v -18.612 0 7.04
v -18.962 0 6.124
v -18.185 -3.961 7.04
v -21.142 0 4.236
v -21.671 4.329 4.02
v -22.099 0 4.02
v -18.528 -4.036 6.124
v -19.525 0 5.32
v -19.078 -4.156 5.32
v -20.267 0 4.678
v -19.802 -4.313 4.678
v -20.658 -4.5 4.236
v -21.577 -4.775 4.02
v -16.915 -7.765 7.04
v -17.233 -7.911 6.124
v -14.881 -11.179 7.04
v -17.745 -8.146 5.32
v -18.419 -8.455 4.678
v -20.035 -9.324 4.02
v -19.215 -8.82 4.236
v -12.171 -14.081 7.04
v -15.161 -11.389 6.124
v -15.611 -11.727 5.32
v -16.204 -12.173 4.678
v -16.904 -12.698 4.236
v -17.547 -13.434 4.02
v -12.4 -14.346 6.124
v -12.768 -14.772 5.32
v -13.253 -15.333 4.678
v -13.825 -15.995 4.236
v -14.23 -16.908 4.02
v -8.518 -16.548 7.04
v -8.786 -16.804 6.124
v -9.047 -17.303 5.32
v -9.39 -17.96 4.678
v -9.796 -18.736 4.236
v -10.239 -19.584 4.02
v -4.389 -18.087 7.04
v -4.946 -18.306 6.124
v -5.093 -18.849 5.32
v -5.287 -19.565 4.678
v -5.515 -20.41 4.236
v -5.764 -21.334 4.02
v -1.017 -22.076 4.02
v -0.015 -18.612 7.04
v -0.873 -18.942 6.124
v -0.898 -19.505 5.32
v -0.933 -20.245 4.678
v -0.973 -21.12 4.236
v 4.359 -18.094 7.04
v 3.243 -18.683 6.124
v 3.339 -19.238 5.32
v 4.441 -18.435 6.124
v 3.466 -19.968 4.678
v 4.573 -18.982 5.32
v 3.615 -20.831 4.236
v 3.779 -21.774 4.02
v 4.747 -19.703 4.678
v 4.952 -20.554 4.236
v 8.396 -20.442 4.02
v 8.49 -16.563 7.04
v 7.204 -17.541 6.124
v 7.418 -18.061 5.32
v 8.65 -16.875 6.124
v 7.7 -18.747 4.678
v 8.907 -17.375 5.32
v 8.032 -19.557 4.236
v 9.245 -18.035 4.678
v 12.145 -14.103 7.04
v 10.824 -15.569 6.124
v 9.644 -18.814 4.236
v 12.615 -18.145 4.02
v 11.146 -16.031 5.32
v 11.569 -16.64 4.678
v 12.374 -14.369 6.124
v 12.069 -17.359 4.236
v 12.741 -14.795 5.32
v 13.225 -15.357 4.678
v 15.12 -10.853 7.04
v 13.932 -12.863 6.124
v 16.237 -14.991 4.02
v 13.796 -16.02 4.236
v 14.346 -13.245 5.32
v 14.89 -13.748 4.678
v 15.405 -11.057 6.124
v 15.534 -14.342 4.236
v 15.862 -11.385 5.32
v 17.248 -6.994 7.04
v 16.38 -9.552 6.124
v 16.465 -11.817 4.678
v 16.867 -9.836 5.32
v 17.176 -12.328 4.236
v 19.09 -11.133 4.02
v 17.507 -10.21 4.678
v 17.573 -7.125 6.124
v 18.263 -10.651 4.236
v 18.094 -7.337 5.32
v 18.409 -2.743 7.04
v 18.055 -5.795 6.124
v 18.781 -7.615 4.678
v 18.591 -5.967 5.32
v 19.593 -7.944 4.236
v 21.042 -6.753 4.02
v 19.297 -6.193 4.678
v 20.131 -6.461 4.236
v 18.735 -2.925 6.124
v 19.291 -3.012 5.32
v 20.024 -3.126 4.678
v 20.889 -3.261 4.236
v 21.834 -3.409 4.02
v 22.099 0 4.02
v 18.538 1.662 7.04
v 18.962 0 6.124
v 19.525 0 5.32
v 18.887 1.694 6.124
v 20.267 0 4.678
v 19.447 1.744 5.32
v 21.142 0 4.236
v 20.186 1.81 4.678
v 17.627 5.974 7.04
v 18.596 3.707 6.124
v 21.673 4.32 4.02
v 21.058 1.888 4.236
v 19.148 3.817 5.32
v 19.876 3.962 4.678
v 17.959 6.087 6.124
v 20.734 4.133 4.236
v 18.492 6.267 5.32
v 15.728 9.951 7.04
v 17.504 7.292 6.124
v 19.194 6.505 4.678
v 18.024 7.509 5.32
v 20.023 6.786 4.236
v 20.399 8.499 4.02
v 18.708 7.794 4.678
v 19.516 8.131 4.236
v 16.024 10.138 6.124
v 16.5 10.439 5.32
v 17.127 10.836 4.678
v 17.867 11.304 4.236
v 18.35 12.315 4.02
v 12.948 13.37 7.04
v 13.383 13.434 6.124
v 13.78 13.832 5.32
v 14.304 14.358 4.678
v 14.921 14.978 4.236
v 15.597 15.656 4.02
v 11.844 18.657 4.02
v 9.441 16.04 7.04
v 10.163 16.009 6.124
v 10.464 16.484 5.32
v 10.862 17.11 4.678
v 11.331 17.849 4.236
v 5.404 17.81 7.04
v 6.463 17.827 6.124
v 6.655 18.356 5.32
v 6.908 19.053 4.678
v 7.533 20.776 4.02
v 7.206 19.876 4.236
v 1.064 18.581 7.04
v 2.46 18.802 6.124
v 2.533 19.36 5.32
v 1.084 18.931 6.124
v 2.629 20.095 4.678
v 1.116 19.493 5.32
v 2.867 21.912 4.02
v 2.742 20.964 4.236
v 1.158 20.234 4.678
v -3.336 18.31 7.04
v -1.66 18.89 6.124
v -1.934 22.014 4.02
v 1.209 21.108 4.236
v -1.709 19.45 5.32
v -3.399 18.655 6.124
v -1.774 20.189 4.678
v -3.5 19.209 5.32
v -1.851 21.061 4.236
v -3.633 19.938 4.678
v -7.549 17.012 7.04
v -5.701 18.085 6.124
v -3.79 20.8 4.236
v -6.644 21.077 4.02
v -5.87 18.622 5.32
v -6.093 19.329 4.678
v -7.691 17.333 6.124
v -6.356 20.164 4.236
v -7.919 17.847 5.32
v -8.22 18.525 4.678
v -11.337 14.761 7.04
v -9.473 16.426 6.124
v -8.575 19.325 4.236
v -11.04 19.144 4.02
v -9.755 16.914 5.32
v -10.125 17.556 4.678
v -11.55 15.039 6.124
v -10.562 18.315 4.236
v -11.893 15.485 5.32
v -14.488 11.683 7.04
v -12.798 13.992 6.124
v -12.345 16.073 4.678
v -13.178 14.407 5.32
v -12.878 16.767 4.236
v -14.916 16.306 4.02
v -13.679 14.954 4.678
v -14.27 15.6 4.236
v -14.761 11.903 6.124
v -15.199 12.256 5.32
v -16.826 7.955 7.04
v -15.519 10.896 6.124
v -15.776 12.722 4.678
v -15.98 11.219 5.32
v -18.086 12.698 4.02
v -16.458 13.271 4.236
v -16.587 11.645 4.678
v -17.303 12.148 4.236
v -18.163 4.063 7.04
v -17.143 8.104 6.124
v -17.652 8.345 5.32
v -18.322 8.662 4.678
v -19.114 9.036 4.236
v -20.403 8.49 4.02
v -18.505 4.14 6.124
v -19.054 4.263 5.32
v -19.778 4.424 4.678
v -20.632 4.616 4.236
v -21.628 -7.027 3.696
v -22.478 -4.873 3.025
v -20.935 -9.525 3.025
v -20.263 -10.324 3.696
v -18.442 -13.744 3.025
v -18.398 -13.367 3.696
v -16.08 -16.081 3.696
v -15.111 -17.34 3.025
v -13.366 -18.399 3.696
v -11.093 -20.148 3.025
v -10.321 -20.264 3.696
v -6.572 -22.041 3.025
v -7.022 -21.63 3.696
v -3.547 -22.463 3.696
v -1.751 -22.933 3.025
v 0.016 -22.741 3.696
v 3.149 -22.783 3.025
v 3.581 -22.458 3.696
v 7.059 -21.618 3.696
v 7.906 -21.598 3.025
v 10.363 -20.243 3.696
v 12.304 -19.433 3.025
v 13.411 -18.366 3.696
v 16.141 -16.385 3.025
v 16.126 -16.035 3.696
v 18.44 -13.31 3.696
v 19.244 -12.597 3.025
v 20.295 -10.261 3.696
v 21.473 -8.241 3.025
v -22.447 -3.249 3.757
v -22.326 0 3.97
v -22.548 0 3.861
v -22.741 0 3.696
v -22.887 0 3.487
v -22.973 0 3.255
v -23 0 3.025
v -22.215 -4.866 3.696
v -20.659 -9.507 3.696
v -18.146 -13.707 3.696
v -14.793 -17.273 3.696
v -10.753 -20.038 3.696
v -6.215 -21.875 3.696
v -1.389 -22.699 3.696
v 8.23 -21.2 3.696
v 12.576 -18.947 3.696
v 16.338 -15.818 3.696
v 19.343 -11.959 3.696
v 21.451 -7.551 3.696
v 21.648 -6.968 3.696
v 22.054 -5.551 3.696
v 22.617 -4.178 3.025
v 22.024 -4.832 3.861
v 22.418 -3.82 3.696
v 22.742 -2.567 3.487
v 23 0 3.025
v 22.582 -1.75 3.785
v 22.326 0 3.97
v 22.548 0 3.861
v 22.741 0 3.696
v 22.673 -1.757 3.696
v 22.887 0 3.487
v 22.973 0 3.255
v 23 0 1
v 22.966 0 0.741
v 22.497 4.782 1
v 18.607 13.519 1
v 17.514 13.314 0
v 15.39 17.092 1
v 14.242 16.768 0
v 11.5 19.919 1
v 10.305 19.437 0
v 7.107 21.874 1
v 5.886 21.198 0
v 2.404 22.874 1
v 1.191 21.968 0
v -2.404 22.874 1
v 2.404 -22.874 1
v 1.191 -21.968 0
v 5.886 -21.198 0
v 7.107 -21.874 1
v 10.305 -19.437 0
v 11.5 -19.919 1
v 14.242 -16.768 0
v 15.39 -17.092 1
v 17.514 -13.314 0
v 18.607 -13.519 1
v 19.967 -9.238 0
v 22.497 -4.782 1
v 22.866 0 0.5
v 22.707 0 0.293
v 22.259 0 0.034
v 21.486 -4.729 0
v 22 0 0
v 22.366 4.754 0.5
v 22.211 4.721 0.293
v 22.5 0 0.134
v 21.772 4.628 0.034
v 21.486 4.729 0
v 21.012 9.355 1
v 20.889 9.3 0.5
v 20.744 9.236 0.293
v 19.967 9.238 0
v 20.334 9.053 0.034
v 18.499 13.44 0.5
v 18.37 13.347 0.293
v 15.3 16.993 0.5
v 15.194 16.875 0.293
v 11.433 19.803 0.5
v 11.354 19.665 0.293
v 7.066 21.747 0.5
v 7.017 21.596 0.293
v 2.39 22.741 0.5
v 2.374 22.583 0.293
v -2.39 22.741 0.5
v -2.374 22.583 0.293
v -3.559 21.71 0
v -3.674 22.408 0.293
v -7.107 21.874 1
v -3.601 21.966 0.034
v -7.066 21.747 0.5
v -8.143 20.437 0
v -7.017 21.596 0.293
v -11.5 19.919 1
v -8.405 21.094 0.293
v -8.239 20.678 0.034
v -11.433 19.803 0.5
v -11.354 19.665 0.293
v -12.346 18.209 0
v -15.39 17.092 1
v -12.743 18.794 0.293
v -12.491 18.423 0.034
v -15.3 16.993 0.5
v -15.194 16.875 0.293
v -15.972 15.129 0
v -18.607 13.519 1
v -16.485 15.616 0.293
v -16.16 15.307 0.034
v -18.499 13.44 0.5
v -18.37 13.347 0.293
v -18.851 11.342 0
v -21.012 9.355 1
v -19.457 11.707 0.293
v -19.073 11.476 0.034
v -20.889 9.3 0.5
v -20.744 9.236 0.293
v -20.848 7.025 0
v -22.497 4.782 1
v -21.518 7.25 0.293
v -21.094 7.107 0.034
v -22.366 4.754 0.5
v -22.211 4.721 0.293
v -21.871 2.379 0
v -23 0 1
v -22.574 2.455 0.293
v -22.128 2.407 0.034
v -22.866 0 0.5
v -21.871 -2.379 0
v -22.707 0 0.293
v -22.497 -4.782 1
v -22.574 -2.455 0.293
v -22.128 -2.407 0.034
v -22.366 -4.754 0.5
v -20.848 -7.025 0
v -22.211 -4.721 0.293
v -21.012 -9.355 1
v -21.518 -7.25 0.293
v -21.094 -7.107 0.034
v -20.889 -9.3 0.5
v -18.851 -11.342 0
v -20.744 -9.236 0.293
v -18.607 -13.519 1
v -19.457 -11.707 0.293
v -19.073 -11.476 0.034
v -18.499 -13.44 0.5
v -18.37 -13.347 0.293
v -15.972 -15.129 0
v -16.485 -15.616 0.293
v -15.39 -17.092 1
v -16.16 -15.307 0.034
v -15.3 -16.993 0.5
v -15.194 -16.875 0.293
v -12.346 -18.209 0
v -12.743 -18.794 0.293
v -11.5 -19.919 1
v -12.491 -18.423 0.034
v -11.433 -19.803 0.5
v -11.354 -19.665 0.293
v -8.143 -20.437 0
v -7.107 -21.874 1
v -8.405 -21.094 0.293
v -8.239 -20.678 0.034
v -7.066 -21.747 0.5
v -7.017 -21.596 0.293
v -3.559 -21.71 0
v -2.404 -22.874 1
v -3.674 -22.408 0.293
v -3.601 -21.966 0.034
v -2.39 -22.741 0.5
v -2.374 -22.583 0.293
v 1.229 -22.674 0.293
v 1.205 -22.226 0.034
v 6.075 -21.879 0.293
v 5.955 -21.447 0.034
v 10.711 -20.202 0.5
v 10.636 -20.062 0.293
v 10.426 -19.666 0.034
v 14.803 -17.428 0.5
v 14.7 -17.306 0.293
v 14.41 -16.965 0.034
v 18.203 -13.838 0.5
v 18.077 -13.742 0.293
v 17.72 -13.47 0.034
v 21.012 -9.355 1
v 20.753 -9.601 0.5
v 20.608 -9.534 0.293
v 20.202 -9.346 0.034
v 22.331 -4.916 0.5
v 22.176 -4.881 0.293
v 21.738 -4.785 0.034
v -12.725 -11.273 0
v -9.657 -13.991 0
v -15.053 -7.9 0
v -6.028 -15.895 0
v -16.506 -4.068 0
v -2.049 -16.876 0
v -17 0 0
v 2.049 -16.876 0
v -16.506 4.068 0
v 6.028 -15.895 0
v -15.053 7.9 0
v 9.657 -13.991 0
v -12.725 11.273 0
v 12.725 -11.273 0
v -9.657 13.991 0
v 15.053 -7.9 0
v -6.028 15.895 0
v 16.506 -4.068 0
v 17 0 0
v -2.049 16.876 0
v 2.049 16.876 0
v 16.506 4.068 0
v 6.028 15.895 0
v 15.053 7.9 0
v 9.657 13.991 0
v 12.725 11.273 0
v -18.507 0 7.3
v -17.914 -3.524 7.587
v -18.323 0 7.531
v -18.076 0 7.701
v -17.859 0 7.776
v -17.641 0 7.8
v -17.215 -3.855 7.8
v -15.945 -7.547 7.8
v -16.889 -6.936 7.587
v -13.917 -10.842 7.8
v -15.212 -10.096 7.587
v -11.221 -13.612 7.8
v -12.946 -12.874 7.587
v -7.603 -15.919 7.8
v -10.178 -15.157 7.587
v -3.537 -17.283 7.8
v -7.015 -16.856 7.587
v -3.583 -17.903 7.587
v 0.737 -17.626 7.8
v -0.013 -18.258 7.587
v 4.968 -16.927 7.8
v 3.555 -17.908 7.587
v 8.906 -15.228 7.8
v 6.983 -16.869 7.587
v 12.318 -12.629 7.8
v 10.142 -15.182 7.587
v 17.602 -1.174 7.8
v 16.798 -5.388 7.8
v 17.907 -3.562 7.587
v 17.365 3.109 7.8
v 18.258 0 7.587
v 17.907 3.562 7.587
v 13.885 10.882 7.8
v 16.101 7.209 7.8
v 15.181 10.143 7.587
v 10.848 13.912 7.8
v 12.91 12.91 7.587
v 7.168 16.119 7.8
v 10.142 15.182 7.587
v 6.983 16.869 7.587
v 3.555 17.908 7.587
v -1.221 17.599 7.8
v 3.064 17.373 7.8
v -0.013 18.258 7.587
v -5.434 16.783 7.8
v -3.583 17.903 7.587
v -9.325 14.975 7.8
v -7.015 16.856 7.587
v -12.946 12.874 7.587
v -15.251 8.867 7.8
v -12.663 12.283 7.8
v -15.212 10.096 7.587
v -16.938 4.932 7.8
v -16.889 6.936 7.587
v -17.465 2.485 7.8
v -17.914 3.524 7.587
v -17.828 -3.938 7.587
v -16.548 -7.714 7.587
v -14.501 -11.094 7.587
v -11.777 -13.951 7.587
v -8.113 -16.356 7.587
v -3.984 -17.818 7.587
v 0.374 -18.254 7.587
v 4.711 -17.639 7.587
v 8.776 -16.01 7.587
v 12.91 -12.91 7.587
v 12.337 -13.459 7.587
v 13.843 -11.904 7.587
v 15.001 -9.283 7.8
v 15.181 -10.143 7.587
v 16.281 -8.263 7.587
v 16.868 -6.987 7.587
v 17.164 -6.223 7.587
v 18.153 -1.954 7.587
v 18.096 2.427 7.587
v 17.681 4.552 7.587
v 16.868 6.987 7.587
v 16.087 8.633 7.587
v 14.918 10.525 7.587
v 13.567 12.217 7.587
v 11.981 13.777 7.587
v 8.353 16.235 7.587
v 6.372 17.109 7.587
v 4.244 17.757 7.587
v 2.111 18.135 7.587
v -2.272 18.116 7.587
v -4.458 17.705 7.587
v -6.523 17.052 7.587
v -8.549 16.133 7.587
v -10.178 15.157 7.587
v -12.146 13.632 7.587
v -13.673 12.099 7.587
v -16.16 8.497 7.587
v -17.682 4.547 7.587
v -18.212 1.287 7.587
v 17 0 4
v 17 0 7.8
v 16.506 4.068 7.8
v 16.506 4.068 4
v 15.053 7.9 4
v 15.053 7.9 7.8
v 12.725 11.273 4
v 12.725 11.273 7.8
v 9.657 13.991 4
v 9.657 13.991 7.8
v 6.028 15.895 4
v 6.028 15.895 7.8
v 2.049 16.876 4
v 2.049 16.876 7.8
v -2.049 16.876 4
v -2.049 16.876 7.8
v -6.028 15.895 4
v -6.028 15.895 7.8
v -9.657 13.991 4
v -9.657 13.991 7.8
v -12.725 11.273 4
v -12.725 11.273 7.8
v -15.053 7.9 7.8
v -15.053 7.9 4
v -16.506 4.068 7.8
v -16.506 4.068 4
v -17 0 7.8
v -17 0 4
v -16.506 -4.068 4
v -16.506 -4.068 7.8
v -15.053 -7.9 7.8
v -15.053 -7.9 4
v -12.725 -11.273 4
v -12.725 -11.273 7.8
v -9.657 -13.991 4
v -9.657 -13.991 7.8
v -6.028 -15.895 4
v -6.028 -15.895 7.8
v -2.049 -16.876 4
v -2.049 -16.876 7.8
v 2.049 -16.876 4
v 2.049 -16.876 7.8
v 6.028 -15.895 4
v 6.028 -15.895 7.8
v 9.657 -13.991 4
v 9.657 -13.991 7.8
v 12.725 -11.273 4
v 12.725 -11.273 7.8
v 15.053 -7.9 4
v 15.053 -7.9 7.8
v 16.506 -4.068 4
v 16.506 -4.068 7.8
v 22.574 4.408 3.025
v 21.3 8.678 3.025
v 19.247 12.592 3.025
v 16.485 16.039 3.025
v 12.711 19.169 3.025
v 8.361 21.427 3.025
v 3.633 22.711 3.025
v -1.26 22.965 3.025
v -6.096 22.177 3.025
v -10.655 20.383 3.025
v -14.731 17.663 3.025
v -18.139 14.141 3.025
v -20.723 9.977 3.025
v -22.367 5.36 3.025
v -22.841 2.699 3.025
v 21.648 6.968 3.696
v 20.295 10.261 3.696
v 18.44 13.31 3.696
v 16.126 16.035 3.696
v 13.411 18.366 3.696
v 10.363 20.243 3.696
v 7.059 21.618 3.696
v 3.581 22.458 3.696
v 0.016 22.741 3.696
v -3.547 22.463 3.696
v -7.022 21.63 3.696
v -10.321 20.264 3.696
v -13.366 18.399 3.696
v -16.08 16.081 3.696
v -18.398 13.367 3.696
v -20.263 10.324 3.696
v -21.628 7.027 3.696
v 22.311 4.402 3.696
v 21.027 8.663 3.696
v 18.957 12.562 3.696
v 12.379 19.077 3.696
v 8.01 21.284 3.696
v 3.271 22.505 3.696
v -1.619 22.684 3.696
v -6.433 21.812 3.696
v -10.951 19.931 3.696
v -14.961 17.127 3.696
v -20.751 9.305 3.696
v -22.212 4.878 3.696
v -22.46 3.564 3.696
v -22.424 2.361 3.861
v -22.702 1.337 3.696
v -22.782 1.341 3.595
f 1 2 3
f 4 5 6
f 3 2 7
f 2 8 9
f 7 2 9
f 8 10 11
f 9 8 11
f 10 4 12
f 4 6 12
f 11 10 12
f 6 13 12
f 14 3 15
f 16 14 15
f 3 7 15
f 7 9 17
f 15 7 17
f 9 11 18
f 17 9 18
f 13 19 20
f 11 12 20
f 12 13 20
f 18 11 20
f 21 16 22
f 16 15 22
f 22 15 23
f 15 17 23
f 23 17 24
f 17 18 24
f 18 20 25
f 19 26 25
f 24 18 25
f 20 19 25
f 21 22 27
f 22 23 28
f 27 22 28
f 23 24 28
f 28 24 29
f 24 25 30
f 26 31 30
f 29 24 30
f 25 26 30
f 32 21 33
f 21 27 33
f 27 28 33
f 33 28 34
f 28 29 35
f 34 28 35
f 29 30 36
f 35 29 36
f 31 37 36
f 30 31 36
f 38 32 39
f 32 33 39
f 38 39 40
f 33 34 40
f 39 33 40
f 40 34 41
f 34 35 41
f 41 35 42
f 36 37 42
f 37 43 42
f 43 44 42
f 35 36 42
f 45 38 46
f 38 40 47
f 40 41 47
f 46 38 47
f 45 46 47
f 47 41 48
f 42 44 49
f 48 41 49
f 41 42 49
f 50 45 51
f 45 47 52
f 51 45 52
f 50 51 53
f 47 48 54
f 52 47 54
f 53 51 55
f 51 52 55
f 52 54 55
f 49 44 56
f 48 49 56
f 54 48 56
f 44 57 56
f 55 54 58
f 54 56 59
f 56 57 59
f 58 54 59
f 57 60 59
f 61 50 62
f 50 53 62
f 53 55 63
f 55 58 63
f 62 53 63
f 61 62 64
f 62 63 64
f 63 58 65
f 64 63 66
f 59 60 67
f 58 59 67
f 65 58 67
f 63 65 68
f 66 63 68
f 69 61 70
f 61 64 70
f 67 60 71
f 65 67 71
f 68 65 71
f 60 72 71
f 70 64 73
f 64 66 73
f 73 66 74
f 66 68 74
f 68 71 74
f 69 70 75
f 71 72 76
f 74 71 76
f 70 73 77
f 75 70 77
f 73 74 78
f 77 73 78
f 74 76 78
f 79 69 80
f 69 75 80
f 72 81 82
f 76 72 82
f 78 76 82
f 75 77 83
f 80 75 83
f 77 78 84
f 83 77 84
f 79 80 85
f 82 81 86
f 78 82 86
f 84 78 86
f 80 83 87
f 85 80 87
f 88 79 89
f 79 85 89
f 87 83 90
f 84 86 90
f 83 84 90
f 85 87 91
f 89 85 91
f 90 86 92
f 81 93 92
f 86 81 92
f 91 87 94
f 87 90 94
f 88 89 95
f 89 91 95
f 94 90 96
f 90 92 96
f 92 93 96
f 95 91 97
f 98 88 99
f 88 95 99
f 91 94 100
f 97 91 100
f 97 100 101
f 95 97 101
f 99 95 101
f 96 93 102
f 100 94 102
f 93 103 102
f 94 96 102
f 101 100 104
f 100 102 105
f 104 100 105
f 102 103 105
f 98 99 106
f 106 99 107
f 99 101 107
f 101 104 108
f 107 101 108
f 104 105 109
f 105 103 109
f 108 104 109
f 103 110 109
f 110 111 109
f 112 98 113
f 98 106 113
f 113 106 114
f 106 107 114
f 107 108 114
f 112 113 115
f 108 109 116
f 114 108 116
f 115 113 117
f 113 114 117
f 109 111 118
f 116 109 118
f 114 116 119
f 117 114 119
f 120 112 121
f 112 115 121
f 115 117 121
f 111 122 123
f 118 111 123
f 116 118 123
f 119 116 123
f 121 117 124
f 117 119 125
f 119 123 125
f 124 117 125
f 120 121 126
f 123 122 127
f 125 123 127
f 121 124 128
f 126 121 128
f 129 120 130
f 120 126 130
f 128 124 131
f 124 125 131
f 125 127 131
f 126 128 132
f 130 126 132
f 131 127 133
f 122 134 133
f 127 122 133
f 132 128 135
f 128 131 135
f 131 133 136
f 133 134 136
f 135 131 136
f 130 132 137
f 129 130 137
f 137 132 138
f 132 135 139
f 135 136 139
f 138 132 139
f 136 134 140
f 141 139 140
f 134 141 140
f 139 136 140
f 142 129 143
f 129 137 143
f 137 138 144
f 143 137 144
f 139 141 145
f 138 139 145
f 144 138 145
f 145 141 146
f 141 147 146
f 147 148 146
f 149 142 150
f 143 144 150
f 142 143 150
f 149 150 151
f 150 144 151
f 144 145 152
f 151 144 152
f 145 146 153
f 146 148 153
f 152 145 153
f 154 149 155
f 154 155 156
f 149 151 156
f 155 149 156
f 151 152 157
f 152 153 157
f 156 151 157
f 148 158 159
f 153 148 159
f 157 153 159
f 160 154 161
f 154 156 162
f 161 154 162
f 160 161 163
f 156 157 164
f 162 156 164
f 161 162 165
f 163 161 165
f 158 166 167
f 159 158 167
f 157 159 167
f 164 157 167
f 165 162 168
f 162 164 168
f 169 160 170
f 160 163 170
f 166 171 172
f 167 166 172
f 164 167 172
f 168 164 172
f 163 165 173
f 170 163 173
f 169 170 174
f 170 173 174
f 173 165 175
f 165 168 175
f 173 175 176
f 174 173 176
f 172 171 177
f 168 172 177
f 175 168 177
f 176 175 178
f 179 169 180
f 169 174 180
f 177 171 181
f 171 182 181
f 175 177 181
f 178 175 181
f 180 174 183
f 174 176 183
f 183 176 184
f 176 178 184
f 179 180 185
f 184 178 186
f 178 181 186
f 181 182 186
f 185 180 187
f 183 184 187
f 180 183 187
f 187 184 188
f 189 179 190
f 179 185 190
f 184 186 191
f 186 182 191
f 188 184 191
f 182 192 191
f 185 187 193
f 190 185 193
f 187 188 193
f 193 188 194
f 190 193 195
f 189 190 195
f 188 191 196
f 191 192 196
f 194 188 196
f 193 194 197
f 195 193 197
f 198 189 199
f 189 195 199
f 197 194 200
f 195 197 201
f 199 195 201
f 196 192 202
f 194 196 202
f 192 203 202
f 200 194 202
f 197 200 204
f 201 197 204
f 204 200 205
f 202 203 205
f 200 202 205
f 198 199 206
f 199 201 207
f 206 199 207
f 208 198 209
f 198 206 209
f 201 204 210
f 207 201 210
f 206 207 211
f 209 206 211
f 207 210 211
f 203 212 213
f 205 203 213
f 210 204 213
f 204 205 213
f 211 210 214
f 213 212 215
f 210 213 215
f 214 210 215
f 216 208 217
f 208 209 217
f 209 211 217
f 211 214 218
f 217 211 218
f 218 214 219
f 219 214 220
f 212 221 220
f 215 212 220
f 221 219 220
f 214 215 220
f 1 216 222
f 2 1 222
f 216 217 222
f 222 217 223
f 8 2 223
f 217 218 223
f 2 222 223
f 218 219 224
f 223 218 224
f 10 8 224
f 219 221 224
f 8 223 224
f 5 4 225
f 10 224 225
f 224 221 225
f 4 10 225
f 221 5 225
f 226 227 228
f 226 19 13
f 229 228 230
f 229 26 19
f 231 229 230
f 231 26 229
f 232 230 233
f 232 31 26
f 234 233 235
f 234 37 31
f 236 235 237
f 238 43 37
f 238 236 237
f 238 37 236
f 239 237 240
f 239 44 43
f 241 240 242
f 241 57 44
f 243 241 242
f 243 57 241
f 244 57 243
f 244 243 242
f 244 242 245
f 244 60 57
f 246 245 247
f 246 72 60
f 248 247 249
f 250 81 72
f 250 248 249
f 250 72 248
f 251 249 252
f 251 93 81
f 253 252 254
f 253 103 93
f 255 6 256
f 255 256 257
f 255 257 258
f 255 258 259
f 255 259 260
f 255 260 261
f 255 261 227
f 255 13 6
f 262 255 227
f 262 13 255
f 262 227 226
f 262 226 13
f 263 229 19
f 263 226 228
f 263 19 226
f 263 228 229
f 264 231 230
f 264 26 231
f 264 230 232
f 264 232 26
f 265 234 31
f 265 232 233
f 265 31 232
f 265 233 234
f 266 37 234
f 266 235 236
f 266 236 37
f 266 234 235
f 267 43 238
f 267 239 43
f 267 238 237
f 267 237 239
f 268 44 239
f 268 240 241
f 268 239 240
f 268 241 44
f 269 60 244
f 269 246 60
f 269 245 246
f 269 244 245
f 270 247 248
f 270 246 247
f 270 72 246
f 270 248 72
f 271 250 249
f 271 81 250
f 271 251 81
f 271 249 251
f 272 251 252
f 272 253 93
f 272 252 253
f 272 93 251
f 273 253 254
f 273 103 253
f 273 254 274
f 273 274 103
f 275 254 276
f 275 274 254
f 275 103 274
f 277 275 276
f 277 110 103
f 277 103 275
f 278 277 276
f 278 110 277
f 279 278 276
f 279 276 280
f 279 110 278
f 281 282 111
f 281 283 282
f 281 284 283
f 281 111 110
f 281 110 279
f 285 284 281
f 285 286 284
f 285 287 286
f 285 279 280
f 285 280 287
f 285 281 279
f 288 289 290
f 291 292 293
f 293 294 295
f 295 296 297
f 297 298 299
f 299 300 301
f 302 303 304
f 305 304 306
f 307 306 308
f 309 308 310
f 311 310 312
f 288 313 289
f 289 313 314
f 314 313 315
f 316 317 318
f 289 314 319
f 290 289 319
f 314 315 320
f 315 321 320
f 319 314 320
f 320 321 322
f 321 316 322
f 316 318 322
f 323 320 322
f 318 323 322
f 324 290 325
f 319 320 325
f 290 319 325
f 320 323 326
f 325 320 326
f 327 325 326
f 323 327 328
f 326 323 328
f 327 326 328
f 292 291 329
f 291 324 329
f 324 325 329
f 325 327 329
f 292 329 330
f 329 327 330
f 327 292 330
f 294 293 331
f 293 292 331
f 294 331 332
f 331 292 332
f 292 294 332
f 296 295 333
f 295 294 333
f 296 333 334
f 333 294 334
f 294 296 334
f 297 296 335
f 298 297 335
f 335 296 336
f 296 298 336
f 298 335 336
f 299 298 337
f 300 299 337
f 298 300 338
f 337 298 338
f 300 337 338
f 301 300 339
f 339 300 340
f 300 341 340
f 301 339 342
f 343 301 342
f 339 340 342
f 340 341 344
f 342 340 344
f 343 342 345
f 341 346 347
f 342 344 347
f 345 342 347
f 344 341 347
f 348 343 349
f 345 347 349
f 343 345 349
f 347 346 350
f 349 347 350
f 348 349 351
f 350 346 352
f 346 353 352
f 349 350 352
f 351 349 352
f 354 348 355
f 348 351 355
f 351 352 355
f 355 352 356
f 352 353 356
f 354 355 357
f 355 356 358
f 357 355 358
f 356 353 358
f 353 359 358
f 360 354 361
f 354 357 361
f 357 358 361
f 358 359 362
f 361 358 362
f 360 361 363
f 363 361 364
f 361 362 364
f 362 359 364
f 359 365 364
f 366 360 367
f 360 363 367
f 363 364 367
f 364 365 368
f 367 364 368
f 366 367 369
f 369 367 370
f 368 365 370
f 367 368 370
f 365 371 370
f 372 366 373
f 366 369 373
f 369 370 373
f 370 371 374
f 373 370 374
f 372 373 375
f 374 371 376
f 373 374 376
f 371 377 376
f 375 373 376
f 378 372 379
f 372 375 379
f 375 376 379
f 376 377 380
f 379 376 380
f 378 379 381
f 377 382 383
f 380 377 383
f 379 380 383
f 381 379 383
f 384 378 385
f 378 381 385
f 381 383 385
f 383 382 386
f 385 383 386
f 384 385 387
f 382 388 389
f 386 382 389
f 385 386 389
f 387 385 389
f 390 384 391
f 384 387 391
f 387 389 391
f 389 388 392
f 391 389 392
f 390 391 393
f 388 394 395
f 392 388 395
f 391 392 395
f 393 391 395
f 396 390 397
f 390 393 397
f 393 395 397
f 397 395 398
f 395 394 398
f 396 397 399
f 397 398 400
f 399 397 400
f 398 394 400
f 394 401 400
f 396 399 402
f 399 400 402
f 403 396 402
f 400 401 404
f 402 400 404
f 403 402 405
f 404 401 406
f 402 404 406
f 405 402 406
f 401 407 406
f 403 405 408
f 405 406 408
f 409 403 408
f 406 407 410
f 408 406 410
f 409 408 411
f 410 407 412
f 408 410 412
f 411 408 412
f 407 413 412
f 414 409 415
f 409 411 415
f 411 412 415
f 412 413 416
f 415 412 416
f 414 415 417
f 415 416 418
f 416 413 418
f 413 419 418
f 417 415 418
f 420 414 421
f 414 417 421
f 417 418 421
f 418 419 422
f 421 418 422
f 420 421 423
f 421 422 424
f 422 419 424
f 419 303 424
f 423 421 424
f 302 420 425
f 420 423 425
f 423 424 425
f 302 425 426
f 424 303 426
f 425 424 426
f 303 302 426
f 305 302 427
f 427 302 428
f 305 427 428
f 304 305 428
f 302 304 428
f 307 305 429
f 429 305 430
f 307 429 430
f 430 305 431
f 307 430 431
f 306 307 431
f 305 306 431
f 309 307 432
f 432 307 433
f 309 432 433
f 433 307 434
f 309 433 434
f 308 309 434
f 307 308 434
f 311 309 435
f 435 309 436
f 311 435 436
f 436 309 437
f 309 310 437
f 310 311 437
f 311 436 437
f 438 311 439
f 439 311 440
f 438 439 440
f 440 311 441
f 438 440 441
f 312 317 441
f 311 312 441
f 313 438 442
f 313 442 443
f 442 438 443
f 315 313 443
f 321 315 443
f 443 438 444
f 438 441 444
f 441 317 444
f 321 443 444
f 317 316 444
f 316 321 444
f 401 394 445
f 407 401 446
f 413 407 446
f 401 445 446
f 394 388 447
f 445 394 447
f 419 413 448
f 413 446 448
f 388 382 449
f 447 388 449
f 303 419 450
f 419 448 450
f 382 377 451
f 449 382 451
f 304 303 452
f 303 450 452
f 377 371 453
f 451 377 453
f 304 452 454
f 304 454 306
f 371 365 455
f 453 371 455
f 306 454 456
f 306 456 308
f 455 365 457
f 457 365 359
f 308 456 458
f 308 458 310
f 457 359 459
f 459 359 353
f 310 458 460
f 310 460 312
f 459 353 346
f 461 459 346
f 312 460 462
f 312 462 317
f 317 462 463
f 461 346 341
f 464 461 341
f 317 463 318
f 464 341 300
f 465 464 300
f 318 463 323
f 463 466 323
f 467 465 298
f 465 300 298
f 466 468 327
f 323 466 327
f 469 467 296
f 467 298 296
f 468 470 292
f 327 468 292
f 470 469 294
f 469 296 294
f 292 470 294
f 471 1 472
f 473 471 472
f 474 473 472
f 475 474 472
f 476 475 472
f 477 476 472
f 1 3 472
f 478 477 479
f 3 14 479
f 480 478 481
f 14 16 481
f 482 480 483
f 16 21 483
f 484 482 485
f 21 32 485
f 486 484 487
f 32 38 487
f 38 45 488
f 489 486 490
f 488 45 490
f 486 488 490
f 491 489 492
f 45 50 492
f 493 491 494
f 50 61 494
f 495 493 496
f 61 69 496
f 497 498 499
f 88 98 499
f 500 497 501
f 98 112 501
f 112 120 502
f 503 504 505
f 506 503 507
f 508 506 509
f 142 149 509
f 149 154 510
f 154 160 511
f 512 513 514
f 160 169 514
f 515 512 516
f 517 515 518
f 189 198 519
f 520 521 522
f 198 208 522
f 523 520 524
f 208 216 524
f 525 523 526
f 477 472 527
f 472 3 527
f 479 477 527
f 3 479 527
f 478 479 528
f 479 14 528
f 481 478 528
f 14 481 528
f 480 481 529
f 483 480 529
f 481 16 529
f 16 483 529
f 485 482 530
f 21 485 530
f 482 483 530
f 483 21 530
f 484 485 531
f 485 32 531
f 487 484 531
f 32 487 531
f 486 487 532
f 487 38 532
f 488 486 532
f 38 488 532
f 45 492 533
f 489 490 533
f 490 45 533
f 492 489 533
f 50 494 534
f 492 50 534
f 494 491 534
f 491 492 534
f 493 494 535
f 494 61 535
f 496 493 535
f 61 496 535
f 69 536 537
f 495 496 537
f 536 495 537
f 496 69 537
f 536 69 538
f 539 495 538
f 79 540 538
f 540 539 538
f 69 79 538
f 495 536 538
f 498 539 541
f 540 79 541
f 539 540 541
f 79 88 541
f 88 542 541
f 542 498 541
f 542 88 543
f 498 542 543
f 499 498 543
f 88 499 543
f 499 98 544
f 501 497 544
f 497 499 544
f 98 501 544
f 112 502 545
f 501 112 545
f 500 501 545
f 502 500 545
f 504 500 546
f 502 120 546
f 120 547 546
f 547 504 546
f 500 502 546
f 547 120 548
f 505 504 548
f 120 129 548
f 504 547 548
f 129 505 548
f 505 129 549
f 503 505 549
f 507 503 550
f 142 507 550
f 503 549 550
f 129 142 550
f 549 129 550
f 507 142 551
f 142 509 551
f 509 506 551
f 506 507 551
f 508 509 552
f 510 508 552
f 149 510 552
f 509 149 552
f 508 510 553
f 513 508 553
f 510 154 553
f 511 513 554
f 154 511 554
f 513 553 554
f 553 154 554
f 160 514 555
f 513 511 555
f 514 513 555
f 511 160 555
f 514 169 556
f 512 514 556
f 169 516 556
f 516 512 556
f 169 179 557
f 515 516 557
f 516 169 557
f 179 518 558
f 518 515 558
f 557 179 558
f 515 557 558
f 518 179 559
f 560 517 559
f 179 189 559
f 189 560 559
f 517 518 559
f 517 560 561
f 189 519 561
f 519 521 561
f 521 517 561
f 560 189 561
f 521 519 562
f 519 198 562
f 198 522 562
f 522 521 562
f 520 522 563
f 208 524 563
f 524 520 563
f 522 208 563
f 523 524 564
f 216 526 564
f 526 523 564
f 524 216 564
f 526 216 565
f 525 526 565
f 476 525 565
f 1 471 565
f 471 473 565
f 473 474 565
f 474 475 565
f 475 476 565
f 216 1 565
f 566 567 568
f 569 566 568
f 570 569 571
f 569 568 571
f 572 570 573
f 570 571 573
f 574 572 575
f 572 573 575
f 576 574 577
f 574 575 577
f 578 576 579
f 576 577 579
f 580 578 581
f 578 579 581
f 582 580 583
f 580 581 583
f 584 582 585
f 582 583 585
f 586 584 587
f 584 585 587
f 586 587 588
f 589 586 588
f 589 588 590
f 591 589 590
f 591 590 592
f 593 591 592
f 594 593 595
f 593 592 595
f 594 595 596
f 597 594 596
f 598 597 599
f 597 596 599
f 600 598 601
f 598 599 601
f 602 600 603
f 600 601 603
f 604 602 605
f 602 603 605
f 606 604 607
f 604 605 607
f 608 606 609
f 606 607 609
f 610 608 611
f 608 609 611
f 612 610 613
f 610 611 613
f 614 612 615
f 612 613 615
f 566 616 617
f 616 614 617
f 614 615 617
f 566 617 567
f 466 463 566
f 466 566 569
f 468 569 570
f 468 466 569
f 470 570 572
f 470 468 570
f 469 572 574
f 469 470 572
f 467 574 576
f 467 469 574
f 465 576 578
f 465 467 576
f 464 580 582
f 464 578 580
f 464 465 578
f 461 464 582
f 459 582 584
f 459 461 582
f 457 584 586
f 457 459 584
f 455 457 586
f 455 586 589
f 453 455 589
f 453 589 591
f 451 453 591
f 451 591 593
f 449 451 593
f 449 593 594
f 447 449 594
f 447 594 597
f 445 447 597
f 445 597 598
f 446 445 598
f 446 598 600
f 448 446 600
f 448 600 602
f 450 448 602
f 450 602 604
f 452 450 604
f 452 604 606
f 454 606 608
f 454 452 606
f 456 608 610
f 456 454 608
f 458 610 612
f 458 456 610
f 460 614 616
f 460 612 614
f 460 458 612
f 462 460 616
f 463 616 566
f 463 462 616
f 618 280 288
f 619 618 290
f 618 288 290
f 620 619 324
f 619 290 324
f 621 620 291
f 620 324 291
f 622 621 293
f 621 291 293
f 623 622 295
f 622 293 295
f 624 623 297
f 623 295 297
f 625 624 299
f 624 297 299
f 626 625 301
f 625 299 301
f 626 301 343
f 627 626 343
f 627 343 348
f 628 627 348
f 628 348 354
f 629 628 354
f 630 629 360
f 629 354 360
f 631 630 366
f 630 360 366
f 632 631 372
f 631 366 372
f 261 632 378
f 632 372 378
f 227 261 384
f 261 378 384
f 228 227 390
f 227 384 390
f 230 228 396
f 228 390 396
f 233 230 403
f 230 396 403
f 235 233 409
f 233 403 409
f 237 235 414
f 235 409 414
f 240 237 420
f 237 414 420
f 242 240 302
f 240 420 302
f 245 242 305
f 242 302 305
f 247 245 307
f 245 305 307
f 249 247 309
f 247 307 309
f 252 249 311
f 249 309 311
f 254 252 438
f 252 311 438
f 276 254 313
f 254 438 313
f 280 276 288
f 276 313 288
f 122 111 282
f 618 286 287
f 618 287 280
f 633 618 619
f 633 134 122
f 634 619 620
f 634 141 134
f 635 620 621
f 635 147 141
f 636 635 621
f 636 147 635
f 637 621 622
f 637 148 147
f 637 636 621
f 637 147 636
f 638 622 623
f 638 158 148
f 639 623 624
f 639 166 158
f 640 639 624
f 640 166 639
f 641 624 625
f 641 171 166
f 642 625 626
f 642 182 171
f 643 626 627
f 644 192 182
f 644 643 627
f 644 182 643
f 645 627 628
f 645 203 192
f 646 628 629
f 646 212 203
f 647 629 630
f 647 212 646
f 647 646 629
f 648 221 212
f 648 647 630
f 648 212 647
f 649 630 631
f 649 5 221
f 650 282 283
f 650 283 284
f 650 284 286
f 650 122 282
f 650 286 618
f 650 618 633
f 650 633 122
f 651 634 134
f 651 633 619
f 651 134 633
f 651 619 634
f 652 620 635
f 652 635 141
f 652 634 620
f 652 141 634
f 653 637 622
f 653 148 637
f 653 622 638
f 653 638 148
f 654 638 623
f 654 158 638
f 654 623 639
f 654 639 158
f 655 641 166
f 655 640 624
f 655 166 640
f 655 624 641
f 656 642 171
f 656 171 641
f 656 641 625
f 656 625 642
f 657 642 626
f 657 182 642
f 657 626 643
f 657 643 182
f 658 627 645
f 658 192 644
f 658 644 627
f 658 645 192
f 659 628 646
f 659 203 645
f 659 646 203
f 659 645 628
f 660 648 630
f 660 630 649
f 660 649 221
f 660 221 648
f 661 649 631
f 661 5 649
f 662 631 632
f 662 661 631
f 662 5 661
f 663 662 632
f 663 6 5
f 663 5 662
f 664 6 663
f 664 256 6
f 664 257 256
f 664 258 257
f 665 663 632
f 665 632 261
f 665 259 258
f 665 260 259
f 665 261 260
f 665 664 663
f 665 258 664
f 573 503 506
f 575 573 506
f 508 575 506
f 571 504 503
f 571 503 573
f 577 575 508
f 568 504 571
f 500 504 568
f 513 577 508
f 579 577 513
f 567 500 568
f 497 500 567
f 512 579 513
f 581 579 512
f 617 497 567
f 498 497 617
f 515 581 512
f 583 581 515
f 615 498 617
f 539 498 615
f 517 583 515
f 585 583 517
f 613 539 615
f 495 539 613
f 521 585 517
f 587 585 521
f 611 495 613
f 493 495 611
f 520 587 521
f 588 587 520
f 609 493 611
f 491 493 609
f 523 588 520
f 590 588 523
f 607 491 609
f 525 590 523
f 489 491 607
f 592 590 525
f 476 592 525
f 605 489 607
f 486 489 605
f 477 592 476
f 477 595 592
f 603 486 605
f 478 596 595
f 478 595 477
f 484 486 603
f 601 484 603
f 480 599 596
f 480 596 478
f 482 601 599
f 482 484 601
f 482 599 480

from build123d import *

# Parameters (mm, degrees)
SKETCH1_R               = 23
BOSS_EXTRUDE1_DEPTH     = 4
CUT_EXTRUDE1_DEPTH      = 33.771939216
CUT_EXTRUDE1_DEPTH_BACK = 33.771939216
SKETCH2_R               = 17
BOSS_EXTRUDE2_START     = 3.8
SKETCH3_R               = 18.5
SKETCH3_R_2             = 17
BOSS_EXTRUDE2_DEPTH     = 3.8
FILLET1_R               = 4
FILLET2_R               = 1
FILLET3_R               = 1


with BuildPart() as part:
    # Sketch1 → Boss-Extrude1 (new body)
    with BuildSketch(Plane.XY):
        Circle(SKETCH1_R)
    extrude(amount=BOSS_EXTRUDE1_DEPTH)

    # Sketch2 → Cut-Extrude1 (cut, two sides: drawn at the far end of the back side and taken through both)
    with BuildSketch(Plane.XY.offset(4).offset(-CUT_EXTRUDE1_DEPTH_BACK)):
        Circle(SKETCH2_R)
    extrude(amount=CUT_EXTRUDE1_DEPTH + CUT_EXTRUDE1_DEPTH_BACK, mode=Mode.SUBTRACT)

    # Sketch3 → Boss-Extrude2 (add)
    with BuildSketch(Plane.XY.offset(4).offset(BOSS_EXTRUDE2_START)):
        with Locations(Location((0, 0, 0), (0, 0, 180))):
            Circle(SKETCH3_R)
        Circle(SKETCH3_R_2, mode=Mode.SUBTRACT)
    extrude(amount=-BOSS_EXTRUDE2_DEPTH)

    # Fillet1
    # the kernel refuses this fillet: 4 mm, written as the material it adds along each edge
    with BuildSketch(Plane(origin=(0, 0, 4), x_dir=(-1, 0, 0), z_dir=(0, 1, 0))) as fillet1_piece_1:
        with BuildLine():
            CenterArc((22.494996871, 4), FILLET1_R, 182.865983983, 87.134016017)
            Line((18.5, 3.8), (18.420100063, 3.796))
            ThreePointArc((18.420100063, 3.796), (18.42, 1.9), (18.42, 0))
            Line((18.42, 0), (18.5, -0.08))
            Line((18.5, -0.08), (22.494996871, -0.08))
            Line((22.494996871, -0.08), (22.494996871, 0))
        make_face()
    revolve(axis=Axis((0, 0, 4), (0, 0, 1)))

    # Fillet2
    fillet2_edges = [part.edges().sort_by_distance(p)[0] for p in [
        (18.5, 0, 7.8),
    ]]
    fillet(fillet2_edges, radius=FILLET2_R)

    # Fillet3
    fillet3_edges = [part.edges().sort_by_distance(p)[0] for p in [
        (-23, 0, 0),
        (-23, 0, 4),
    ]]
    fillet(fillet3_edges, radius=FILLET3_R)


solid = part.part
